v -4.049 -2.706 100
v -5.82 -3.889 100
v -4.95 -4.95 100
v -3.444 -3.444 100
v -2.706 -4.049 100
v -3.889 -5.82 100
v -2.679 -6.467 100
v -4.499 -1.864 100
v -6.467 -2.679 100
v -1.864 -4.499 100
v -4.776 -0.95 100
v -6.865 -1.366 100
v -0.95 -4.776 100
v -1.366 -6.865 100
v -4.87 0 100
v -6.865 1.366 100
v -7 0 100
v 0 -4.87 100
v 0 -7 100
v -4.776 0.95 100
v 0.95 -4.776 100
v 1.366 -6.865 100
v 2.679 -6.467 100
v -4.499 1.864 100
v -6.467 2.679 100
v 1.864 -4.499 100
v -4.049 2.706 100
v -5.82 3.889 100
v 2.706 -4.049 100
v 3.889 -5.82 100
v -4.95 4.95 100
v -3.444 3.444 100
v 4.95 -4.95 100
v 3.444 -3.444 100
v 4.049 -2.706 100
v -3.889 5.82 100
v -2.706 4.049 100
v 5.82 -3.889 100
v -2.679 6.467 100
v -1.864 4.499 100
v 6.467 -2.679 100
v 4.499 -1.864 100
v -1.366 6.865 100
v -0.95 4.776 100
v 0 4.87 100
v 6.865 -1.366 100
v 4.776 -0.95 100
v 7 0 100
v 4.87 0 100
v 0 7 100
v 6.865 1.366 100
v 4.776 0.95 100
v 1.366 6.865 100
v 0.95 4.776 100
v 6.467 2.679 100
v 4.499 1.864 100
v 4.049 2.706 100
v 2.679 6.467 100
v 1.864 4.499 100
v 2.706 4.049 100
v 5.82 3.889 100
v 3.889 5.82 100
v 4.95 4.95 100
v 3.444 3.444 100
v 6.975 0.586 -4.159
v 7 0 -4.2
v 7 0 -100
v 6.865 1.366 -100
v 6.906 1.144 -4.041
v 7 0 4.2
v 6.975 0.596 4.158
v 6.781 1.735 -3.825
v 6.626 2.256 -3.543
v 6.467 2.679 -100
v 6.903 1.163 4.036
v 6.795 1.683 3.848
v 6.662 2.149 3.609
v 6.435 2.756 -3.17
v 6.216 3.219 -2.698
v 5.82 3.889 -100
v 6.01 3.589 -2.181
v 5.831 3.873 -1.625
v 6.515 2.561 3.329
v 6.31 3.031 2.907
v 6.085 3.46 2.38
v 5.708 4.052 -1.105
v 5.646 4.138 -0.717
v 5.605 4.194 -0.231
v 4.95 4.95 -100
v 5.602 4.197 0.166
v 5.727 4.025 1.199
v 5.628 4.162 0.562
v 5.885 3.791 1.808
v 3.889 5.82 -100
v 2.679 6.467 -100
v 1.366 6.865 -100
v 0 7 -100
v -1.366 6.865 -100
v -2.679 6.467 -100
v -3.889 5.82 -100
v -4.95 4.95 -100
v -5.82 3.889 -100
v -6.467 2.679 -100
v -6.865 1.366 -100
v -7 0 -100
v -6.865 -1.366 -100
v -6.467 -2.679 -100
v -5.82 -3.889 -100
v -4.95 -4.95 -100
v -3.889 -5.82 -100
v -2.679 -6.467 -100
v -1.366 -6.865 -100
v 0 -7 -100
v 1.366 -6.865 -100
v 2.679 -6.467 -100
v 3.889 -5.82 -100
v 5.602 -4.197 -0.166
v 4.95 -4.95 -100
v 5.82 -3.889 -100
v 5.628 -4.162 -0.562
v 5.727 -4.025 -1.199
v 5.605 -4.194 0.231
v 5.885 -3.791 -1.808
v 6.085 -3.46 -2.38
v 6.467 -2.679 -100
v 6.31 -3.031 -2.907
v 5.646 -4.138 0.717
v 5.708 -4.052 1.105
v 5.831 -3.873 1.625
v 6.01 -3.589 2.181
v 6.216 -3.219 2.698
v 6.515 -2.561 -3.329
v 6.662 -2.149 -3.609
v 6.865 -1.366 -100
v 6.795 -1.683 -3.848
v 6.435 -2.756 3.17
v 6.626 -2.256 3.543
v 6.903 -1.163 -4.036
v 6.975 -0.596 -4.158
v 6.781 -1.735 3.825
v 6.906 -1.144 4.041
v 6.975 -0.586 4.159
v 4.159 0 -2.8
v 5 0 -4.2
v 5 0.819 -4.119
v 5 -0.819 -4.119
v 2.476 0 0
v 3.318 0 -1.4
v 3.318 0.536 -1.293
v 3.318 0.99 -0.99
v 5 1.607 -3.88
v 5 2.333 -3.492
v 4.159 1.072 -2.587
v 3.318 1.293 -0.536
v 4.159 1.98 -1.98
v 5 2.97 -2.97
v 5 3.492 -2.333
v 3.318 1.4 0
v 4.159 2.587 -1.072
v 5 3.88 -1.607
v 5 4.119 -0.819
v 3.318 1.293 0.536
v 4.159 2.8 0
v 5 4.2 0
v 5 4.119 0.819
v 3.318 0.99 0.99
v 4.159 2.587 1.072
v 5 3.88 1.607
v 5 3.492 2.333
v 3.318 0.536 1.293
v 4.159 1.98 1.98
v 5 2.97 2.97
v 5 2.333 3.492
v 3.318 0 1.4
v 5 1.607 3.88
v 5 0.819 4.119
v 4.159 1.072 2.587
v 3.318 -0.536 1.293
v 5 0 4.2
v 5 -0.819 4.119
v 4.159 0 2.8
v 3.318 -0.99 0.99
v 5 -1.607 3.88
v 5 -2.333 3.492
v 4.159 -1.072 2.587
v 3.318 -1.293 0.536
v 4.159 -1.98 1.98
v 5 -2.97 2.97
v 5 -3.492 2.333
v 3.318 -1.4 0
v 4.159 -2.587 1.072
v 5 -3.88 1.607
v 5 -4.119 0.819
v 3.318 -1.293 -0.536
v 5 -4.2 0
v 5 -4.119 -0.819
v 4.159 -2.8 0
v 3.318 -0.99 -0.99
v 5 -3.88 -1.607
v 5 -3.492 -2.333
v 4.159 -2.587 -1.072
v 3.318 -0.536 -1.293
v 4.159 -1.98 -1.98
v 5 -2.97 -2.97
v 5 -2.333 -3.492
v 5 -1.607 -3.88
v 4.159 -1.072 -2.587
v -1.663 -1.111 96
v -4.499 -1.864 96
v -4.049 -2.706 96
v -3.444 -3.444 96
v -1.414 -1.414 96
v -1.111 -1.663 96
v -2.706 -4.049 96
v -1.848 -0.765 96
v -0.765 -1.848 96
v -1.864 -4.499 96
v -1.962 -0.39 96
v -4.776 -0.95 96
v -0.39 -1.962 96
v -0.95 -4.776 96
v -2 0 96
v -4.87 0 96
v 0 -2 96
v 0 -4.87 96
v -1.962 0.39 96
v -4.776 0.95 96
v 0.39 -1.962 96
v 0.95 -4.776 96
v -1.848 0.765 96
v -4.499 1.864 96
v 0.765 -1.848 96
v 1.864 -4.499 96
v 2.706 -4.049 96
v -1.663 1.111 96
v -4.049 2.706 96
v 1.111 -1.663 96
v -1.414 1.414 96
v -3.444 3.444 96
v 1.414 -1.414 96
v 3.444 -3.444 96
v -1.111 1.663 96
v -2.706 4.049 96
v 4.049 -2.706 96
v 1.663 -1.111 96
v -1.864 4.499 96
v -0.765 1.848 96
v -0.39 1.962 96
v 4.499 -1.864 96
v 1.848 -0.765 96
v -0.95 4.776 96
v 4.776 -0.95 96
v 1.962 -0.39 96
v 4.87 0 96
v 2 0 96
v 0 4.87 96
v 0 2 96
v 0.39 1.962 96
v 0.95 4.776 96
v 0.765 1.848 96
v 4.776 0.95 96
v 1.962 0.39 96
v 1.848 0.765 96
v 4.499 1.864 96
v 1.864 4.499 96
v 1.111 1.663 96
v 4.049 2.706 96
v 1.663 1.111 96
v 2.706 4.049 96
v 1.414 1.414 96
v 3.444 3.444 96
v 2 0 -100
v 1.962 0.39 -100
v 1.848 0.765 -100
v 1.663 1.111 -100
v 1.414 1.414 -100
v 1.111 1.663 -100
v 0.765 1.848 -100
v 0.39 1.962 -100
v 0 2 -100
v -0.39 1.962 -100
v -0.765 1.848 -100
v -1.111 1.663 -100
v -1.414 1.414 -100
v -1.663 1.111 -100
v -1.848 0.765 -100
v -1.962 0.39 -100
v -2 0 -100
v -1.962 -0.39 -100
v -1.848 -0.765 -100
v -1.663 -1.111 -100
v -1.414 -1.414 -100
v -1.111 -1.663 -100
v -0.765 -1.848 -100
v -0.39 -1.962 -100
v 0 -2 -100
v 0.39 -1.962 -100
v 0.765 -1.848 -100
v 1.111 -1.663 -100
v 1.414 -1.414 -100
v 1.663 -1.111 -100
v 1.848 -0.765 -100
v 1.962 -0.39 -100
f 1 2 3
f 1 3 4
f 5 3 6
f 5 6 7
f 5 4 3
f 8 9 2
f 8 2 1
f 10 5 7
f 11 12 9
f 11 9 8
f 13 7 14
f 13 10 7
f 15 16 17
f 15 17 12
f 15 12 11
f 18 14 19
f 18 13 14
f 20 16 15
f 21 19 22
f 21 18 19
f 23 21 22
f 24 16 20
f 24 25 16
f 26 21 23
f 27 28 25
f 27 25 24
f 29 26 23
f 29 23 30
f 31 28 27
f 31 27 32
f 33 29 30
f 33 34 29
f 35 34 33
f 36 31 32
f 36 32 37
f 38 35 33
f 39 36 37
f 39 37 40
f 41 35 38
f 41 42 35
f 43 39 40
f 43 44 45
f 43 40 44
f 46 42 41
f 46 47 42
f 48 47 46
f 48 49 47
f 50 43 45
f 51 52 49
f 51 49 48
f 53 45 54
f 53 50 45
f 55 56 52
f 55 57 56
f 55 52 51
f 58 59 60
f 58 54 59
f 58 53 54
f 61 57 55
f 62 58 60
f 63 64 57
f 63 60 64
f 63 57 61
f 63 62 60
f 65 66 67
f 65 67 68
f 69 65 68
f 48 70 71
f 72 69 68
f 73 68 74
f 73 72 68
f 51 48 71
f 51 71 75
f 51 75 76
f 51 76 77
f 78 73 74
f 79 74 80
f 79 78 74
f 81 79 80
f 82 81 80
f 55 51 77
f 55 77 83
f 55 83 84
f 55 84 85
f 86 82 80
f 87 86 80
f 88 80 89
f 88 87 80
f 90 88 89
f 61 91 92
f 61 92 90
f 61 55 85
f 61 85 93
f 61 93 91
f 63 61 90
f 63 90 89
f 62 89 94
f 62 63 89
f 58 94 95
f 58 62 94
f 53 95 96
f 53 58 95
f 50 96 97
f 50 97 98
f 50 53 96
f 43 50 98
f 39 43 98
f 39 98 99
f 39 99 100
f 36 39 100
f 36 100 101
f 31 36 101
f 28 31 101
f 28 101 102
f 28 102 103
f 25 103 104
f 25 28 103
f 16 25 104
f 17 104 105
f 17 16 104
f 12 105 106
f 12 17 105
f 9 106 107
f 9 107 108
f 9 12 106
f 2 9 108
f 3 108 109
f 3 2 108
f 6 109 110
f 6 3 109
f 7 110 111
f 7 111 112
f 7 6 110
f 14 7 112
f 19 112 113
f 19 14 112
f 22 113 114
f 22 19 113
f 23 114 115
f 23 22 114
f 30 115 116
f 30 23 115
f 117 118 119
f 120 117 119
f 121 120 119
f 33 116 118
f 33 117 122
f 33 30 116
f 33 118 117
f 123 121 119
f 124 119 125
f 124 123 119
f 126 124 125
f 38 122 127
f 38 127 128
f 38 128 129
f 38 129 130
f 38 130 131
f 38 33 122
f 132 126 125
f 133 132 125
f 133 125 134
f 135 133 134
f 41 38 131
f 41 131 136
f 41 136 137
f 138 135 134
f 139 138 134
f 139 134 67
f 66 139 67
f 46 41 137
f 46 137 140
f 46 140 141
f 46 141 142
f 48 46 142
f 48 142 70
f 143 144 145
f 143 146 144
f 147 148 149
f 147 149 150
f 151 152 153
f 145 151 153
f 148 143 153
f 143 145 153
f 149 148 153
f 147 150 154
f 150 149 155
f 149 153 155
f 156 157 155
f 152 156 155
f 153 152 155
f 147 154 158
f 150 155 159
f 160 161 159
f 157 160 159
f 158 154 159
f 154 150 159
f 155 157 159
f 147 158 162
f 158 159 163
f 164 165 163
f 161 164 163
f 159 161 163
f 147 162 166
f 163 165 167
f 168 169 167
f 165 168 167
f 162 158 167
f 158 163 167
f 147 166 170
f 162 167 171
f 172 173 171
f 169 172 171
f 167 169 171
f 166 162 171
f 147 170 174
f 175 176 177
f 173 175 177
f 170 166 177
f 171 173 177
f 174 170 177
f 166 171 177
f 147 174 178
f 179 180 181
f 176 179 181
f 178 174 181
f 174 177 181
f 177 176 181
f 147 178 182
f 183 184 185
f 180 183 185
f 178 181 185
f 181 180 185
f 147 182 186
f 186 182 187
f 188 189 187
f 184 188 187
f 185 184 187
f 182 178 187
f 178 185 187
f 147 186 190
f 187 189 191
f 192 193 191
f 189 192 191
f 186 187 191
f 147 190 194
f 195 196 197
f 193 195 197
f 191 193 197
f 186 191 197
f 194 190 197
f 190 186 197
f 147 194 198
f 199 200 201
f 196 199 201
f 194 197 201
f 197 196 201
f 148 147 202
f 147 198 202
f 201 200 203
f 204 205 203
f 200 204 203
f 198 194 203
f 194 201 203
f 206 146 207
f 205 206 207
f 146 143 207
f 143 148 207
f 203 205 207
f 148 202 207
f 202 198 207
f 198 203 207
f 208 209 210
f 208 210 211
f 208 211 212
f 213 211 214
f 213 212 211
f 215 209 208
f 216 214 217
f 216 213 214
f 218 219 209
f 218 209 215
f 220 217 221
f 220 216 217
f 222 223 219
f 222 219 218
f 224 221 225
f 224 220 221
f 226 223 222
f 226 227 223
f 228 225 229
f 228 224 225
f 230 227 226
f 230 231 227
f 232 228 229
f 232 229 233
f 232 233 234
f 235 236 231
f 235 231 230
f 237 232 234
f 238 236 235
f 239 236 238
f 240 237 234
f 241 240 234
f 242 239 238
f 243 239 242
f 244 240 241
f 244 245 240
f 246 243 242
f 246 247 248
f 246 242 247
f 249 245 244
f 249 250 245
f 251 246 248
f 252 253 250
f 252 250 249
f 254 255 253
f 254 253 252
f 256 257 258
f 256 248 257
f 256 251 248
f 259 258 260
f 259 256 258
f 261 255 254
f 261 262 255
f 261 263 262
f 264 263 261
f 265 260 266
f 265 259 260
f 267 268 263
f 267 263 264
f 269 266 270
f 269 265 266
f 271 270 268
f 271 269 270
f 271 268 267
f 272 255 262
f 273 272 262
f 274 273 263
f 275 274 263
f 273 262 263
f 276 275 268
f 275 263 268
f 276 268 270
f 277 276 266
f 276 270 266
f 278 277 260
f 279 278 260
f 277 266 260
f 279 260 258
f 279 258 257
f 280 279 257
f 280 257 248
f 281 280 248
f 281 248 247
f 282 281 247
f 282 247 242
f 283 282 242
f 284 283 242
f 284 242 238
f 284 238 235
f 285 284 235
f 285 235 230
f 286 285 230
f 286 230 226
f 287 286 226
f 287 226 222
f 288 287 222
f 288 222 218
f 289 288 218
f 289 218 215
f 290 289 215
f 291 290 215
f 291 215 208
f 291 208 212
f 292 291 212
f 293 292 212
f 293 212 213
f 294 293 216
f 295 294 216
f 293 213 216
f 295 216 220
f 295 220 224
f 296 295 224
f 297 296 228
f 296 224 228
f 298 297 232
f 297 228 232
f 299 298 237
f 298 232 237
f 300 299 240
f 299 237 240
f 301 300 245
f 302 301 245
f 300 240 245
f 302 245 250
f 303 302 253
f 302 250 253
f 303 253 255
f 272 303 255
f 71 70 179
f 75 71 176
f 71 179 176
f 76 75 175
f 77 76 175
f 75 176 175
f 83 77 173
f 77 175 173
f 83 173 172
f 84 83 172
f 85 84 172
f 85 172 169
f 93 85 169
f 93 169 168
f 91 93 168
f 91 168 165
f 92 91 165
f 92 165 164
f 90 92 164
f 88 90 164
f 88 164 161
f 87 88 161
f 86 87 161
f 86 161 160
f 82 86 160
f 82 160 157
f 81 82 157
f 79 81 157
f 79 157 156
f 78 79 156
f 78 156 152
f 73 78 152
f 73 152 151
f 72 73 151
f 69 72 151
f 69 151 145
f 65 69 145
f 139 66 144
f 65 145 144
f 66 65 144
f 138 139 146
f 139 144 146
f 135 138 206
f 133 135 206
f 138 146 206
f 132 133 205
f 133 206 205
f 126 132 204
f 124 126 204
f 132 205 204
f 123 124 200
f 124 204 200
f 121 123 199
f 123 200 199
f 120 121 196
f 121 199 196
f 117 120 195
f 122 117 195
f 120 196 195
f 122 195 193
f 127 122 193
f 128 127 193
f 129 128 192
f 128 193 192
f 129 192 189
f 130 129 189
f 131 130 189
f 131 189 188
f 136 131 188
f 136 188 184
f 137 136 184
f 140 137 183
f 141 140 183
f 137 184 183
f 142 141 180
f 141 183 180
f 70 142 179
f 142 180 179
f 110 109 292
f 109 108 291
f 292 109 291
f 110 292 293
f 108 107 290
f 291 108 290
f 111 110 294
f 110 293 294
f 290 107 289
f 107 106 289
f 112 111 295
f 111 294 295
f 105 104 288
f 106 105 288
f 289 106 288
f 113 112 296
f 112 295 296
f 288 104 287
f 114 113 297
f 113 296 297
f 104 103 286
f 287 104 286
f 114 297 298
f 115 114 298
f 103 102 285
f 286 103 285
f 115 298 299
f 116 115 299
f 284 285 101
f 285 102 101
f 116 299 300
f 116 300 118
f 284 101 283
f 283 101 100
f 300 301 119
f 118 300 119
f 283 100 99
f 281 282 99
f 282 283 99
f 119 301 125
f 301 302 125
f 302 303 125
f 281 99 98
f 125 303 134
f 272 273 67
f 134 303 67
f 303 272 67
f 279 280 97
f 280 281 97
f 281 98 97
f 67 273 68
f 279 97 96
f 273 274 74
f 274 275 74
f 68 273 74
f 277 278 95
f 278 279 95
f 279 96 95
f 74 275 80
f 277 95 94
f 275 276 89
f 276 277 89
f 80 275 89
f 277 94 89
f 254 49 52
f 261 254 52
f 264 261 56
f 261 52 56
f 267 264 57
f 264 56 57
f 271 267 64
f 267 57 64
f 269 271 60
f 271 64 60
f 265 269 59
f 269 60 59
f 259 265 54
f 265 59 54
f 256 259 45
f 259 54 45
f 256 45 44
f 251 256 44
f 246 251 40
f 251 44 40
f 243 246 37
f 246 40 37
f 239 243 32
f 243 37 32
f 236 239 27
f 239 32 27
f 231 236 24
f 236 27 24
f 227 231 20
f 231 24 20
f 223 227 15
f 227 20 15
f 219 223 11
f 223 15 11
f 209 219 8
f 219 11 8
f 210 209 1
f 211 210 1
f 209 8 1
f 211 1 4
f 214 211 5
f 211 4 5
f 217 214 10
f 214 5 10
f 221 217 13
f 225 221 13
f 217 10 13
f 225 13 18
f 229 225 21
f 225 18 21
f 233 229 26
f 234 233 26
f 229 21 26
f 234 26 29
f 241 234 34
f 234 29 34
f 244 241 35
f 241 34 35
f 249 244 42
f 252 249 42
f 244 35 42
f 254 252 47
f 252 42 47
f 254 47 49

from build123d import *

# Parameters (mm, degrees)
SCHIZZO1_R                   = 7
ESTRUSIONE_ESTRUSIONE1_DEPTH = 100
TAGLIO_ESTRUSIONE1_REACH     = 202.245
SCHIZZO2_R                   = 2
SCHIZZO5_R                   = 4.87
TAGLIO_ESTRUSIONE2_DEPTH     = 4
FORO_PER_VITE_M8_1_D         = 8.4
FORO_PER_VITE_M8_1_DEPTH     = 2
FORO_PER_VITE_M8_1_TIP       = 2.5236146


with BuildPart() as part:
    # Schizzo1 → Estrusione-Estrusione1 (new, symmetric)
    with BuildSketch(Plane.XY):
        Circle(SCHIZZO1_R)
    extrude(amount=ESTRUSIONE_ESTRUSIONE1_DEPTH, both=True)

    # Schizzo2 → Taglio-Estrusione1 (cut, up to next)
    with BuildSketch(Plane.XY.offset(100), mode=Mode.PRIVATE) as taglio_estrusione1_sk1:
        Circle(SCHIZZO2_R)
    taglio_estrusione1_tool1 = extrude(taglio_estrusione1_sk1.sketch, amount=-TAGLIO_ESTRUSIONE1_REACH, mode=Mode.PRIVATE) & part.part
    add(taglio_estrusione1_tool1.solids().sort_by_distance((0, 0, 100))[0], mode=Mode.SUBTRACT)

    # Schizzo5 → Taglio-Estrusione2 (cut)
    with BuildSketch(Plane.XY.offset(100)):
        Circle(SCHIZZO5_R)
    extrude(amount=-TAGLIO_ESTRUSIONE2_DEPTH, mode=Mode.SUBTRACT)

    # Foro per Vite M8-1
    with Locations(Plane(origin=(7, 0, 0), x_dir=(0, 0, -1), z_dir=(1, 0, 0))):
        with Locations((0, 0)):
            Hole(FORO_PER_VITE_M8_1_D / 2, depth=FORO_PER_VITE_M8_1_DEPTH)
            with Locations((0, 0, -(FORO_PER_VITE_M8_1_DEPTH + FORO_PER_VITE_M8_1_TIP / 2))):  # 118° drill point
                Cone(0, FORO_PER_VITE_M8_1_D / 2, FORO_PER_VITE_M8_1_TIP, mode=Mode.SUBTRACT)


solid = part.part
